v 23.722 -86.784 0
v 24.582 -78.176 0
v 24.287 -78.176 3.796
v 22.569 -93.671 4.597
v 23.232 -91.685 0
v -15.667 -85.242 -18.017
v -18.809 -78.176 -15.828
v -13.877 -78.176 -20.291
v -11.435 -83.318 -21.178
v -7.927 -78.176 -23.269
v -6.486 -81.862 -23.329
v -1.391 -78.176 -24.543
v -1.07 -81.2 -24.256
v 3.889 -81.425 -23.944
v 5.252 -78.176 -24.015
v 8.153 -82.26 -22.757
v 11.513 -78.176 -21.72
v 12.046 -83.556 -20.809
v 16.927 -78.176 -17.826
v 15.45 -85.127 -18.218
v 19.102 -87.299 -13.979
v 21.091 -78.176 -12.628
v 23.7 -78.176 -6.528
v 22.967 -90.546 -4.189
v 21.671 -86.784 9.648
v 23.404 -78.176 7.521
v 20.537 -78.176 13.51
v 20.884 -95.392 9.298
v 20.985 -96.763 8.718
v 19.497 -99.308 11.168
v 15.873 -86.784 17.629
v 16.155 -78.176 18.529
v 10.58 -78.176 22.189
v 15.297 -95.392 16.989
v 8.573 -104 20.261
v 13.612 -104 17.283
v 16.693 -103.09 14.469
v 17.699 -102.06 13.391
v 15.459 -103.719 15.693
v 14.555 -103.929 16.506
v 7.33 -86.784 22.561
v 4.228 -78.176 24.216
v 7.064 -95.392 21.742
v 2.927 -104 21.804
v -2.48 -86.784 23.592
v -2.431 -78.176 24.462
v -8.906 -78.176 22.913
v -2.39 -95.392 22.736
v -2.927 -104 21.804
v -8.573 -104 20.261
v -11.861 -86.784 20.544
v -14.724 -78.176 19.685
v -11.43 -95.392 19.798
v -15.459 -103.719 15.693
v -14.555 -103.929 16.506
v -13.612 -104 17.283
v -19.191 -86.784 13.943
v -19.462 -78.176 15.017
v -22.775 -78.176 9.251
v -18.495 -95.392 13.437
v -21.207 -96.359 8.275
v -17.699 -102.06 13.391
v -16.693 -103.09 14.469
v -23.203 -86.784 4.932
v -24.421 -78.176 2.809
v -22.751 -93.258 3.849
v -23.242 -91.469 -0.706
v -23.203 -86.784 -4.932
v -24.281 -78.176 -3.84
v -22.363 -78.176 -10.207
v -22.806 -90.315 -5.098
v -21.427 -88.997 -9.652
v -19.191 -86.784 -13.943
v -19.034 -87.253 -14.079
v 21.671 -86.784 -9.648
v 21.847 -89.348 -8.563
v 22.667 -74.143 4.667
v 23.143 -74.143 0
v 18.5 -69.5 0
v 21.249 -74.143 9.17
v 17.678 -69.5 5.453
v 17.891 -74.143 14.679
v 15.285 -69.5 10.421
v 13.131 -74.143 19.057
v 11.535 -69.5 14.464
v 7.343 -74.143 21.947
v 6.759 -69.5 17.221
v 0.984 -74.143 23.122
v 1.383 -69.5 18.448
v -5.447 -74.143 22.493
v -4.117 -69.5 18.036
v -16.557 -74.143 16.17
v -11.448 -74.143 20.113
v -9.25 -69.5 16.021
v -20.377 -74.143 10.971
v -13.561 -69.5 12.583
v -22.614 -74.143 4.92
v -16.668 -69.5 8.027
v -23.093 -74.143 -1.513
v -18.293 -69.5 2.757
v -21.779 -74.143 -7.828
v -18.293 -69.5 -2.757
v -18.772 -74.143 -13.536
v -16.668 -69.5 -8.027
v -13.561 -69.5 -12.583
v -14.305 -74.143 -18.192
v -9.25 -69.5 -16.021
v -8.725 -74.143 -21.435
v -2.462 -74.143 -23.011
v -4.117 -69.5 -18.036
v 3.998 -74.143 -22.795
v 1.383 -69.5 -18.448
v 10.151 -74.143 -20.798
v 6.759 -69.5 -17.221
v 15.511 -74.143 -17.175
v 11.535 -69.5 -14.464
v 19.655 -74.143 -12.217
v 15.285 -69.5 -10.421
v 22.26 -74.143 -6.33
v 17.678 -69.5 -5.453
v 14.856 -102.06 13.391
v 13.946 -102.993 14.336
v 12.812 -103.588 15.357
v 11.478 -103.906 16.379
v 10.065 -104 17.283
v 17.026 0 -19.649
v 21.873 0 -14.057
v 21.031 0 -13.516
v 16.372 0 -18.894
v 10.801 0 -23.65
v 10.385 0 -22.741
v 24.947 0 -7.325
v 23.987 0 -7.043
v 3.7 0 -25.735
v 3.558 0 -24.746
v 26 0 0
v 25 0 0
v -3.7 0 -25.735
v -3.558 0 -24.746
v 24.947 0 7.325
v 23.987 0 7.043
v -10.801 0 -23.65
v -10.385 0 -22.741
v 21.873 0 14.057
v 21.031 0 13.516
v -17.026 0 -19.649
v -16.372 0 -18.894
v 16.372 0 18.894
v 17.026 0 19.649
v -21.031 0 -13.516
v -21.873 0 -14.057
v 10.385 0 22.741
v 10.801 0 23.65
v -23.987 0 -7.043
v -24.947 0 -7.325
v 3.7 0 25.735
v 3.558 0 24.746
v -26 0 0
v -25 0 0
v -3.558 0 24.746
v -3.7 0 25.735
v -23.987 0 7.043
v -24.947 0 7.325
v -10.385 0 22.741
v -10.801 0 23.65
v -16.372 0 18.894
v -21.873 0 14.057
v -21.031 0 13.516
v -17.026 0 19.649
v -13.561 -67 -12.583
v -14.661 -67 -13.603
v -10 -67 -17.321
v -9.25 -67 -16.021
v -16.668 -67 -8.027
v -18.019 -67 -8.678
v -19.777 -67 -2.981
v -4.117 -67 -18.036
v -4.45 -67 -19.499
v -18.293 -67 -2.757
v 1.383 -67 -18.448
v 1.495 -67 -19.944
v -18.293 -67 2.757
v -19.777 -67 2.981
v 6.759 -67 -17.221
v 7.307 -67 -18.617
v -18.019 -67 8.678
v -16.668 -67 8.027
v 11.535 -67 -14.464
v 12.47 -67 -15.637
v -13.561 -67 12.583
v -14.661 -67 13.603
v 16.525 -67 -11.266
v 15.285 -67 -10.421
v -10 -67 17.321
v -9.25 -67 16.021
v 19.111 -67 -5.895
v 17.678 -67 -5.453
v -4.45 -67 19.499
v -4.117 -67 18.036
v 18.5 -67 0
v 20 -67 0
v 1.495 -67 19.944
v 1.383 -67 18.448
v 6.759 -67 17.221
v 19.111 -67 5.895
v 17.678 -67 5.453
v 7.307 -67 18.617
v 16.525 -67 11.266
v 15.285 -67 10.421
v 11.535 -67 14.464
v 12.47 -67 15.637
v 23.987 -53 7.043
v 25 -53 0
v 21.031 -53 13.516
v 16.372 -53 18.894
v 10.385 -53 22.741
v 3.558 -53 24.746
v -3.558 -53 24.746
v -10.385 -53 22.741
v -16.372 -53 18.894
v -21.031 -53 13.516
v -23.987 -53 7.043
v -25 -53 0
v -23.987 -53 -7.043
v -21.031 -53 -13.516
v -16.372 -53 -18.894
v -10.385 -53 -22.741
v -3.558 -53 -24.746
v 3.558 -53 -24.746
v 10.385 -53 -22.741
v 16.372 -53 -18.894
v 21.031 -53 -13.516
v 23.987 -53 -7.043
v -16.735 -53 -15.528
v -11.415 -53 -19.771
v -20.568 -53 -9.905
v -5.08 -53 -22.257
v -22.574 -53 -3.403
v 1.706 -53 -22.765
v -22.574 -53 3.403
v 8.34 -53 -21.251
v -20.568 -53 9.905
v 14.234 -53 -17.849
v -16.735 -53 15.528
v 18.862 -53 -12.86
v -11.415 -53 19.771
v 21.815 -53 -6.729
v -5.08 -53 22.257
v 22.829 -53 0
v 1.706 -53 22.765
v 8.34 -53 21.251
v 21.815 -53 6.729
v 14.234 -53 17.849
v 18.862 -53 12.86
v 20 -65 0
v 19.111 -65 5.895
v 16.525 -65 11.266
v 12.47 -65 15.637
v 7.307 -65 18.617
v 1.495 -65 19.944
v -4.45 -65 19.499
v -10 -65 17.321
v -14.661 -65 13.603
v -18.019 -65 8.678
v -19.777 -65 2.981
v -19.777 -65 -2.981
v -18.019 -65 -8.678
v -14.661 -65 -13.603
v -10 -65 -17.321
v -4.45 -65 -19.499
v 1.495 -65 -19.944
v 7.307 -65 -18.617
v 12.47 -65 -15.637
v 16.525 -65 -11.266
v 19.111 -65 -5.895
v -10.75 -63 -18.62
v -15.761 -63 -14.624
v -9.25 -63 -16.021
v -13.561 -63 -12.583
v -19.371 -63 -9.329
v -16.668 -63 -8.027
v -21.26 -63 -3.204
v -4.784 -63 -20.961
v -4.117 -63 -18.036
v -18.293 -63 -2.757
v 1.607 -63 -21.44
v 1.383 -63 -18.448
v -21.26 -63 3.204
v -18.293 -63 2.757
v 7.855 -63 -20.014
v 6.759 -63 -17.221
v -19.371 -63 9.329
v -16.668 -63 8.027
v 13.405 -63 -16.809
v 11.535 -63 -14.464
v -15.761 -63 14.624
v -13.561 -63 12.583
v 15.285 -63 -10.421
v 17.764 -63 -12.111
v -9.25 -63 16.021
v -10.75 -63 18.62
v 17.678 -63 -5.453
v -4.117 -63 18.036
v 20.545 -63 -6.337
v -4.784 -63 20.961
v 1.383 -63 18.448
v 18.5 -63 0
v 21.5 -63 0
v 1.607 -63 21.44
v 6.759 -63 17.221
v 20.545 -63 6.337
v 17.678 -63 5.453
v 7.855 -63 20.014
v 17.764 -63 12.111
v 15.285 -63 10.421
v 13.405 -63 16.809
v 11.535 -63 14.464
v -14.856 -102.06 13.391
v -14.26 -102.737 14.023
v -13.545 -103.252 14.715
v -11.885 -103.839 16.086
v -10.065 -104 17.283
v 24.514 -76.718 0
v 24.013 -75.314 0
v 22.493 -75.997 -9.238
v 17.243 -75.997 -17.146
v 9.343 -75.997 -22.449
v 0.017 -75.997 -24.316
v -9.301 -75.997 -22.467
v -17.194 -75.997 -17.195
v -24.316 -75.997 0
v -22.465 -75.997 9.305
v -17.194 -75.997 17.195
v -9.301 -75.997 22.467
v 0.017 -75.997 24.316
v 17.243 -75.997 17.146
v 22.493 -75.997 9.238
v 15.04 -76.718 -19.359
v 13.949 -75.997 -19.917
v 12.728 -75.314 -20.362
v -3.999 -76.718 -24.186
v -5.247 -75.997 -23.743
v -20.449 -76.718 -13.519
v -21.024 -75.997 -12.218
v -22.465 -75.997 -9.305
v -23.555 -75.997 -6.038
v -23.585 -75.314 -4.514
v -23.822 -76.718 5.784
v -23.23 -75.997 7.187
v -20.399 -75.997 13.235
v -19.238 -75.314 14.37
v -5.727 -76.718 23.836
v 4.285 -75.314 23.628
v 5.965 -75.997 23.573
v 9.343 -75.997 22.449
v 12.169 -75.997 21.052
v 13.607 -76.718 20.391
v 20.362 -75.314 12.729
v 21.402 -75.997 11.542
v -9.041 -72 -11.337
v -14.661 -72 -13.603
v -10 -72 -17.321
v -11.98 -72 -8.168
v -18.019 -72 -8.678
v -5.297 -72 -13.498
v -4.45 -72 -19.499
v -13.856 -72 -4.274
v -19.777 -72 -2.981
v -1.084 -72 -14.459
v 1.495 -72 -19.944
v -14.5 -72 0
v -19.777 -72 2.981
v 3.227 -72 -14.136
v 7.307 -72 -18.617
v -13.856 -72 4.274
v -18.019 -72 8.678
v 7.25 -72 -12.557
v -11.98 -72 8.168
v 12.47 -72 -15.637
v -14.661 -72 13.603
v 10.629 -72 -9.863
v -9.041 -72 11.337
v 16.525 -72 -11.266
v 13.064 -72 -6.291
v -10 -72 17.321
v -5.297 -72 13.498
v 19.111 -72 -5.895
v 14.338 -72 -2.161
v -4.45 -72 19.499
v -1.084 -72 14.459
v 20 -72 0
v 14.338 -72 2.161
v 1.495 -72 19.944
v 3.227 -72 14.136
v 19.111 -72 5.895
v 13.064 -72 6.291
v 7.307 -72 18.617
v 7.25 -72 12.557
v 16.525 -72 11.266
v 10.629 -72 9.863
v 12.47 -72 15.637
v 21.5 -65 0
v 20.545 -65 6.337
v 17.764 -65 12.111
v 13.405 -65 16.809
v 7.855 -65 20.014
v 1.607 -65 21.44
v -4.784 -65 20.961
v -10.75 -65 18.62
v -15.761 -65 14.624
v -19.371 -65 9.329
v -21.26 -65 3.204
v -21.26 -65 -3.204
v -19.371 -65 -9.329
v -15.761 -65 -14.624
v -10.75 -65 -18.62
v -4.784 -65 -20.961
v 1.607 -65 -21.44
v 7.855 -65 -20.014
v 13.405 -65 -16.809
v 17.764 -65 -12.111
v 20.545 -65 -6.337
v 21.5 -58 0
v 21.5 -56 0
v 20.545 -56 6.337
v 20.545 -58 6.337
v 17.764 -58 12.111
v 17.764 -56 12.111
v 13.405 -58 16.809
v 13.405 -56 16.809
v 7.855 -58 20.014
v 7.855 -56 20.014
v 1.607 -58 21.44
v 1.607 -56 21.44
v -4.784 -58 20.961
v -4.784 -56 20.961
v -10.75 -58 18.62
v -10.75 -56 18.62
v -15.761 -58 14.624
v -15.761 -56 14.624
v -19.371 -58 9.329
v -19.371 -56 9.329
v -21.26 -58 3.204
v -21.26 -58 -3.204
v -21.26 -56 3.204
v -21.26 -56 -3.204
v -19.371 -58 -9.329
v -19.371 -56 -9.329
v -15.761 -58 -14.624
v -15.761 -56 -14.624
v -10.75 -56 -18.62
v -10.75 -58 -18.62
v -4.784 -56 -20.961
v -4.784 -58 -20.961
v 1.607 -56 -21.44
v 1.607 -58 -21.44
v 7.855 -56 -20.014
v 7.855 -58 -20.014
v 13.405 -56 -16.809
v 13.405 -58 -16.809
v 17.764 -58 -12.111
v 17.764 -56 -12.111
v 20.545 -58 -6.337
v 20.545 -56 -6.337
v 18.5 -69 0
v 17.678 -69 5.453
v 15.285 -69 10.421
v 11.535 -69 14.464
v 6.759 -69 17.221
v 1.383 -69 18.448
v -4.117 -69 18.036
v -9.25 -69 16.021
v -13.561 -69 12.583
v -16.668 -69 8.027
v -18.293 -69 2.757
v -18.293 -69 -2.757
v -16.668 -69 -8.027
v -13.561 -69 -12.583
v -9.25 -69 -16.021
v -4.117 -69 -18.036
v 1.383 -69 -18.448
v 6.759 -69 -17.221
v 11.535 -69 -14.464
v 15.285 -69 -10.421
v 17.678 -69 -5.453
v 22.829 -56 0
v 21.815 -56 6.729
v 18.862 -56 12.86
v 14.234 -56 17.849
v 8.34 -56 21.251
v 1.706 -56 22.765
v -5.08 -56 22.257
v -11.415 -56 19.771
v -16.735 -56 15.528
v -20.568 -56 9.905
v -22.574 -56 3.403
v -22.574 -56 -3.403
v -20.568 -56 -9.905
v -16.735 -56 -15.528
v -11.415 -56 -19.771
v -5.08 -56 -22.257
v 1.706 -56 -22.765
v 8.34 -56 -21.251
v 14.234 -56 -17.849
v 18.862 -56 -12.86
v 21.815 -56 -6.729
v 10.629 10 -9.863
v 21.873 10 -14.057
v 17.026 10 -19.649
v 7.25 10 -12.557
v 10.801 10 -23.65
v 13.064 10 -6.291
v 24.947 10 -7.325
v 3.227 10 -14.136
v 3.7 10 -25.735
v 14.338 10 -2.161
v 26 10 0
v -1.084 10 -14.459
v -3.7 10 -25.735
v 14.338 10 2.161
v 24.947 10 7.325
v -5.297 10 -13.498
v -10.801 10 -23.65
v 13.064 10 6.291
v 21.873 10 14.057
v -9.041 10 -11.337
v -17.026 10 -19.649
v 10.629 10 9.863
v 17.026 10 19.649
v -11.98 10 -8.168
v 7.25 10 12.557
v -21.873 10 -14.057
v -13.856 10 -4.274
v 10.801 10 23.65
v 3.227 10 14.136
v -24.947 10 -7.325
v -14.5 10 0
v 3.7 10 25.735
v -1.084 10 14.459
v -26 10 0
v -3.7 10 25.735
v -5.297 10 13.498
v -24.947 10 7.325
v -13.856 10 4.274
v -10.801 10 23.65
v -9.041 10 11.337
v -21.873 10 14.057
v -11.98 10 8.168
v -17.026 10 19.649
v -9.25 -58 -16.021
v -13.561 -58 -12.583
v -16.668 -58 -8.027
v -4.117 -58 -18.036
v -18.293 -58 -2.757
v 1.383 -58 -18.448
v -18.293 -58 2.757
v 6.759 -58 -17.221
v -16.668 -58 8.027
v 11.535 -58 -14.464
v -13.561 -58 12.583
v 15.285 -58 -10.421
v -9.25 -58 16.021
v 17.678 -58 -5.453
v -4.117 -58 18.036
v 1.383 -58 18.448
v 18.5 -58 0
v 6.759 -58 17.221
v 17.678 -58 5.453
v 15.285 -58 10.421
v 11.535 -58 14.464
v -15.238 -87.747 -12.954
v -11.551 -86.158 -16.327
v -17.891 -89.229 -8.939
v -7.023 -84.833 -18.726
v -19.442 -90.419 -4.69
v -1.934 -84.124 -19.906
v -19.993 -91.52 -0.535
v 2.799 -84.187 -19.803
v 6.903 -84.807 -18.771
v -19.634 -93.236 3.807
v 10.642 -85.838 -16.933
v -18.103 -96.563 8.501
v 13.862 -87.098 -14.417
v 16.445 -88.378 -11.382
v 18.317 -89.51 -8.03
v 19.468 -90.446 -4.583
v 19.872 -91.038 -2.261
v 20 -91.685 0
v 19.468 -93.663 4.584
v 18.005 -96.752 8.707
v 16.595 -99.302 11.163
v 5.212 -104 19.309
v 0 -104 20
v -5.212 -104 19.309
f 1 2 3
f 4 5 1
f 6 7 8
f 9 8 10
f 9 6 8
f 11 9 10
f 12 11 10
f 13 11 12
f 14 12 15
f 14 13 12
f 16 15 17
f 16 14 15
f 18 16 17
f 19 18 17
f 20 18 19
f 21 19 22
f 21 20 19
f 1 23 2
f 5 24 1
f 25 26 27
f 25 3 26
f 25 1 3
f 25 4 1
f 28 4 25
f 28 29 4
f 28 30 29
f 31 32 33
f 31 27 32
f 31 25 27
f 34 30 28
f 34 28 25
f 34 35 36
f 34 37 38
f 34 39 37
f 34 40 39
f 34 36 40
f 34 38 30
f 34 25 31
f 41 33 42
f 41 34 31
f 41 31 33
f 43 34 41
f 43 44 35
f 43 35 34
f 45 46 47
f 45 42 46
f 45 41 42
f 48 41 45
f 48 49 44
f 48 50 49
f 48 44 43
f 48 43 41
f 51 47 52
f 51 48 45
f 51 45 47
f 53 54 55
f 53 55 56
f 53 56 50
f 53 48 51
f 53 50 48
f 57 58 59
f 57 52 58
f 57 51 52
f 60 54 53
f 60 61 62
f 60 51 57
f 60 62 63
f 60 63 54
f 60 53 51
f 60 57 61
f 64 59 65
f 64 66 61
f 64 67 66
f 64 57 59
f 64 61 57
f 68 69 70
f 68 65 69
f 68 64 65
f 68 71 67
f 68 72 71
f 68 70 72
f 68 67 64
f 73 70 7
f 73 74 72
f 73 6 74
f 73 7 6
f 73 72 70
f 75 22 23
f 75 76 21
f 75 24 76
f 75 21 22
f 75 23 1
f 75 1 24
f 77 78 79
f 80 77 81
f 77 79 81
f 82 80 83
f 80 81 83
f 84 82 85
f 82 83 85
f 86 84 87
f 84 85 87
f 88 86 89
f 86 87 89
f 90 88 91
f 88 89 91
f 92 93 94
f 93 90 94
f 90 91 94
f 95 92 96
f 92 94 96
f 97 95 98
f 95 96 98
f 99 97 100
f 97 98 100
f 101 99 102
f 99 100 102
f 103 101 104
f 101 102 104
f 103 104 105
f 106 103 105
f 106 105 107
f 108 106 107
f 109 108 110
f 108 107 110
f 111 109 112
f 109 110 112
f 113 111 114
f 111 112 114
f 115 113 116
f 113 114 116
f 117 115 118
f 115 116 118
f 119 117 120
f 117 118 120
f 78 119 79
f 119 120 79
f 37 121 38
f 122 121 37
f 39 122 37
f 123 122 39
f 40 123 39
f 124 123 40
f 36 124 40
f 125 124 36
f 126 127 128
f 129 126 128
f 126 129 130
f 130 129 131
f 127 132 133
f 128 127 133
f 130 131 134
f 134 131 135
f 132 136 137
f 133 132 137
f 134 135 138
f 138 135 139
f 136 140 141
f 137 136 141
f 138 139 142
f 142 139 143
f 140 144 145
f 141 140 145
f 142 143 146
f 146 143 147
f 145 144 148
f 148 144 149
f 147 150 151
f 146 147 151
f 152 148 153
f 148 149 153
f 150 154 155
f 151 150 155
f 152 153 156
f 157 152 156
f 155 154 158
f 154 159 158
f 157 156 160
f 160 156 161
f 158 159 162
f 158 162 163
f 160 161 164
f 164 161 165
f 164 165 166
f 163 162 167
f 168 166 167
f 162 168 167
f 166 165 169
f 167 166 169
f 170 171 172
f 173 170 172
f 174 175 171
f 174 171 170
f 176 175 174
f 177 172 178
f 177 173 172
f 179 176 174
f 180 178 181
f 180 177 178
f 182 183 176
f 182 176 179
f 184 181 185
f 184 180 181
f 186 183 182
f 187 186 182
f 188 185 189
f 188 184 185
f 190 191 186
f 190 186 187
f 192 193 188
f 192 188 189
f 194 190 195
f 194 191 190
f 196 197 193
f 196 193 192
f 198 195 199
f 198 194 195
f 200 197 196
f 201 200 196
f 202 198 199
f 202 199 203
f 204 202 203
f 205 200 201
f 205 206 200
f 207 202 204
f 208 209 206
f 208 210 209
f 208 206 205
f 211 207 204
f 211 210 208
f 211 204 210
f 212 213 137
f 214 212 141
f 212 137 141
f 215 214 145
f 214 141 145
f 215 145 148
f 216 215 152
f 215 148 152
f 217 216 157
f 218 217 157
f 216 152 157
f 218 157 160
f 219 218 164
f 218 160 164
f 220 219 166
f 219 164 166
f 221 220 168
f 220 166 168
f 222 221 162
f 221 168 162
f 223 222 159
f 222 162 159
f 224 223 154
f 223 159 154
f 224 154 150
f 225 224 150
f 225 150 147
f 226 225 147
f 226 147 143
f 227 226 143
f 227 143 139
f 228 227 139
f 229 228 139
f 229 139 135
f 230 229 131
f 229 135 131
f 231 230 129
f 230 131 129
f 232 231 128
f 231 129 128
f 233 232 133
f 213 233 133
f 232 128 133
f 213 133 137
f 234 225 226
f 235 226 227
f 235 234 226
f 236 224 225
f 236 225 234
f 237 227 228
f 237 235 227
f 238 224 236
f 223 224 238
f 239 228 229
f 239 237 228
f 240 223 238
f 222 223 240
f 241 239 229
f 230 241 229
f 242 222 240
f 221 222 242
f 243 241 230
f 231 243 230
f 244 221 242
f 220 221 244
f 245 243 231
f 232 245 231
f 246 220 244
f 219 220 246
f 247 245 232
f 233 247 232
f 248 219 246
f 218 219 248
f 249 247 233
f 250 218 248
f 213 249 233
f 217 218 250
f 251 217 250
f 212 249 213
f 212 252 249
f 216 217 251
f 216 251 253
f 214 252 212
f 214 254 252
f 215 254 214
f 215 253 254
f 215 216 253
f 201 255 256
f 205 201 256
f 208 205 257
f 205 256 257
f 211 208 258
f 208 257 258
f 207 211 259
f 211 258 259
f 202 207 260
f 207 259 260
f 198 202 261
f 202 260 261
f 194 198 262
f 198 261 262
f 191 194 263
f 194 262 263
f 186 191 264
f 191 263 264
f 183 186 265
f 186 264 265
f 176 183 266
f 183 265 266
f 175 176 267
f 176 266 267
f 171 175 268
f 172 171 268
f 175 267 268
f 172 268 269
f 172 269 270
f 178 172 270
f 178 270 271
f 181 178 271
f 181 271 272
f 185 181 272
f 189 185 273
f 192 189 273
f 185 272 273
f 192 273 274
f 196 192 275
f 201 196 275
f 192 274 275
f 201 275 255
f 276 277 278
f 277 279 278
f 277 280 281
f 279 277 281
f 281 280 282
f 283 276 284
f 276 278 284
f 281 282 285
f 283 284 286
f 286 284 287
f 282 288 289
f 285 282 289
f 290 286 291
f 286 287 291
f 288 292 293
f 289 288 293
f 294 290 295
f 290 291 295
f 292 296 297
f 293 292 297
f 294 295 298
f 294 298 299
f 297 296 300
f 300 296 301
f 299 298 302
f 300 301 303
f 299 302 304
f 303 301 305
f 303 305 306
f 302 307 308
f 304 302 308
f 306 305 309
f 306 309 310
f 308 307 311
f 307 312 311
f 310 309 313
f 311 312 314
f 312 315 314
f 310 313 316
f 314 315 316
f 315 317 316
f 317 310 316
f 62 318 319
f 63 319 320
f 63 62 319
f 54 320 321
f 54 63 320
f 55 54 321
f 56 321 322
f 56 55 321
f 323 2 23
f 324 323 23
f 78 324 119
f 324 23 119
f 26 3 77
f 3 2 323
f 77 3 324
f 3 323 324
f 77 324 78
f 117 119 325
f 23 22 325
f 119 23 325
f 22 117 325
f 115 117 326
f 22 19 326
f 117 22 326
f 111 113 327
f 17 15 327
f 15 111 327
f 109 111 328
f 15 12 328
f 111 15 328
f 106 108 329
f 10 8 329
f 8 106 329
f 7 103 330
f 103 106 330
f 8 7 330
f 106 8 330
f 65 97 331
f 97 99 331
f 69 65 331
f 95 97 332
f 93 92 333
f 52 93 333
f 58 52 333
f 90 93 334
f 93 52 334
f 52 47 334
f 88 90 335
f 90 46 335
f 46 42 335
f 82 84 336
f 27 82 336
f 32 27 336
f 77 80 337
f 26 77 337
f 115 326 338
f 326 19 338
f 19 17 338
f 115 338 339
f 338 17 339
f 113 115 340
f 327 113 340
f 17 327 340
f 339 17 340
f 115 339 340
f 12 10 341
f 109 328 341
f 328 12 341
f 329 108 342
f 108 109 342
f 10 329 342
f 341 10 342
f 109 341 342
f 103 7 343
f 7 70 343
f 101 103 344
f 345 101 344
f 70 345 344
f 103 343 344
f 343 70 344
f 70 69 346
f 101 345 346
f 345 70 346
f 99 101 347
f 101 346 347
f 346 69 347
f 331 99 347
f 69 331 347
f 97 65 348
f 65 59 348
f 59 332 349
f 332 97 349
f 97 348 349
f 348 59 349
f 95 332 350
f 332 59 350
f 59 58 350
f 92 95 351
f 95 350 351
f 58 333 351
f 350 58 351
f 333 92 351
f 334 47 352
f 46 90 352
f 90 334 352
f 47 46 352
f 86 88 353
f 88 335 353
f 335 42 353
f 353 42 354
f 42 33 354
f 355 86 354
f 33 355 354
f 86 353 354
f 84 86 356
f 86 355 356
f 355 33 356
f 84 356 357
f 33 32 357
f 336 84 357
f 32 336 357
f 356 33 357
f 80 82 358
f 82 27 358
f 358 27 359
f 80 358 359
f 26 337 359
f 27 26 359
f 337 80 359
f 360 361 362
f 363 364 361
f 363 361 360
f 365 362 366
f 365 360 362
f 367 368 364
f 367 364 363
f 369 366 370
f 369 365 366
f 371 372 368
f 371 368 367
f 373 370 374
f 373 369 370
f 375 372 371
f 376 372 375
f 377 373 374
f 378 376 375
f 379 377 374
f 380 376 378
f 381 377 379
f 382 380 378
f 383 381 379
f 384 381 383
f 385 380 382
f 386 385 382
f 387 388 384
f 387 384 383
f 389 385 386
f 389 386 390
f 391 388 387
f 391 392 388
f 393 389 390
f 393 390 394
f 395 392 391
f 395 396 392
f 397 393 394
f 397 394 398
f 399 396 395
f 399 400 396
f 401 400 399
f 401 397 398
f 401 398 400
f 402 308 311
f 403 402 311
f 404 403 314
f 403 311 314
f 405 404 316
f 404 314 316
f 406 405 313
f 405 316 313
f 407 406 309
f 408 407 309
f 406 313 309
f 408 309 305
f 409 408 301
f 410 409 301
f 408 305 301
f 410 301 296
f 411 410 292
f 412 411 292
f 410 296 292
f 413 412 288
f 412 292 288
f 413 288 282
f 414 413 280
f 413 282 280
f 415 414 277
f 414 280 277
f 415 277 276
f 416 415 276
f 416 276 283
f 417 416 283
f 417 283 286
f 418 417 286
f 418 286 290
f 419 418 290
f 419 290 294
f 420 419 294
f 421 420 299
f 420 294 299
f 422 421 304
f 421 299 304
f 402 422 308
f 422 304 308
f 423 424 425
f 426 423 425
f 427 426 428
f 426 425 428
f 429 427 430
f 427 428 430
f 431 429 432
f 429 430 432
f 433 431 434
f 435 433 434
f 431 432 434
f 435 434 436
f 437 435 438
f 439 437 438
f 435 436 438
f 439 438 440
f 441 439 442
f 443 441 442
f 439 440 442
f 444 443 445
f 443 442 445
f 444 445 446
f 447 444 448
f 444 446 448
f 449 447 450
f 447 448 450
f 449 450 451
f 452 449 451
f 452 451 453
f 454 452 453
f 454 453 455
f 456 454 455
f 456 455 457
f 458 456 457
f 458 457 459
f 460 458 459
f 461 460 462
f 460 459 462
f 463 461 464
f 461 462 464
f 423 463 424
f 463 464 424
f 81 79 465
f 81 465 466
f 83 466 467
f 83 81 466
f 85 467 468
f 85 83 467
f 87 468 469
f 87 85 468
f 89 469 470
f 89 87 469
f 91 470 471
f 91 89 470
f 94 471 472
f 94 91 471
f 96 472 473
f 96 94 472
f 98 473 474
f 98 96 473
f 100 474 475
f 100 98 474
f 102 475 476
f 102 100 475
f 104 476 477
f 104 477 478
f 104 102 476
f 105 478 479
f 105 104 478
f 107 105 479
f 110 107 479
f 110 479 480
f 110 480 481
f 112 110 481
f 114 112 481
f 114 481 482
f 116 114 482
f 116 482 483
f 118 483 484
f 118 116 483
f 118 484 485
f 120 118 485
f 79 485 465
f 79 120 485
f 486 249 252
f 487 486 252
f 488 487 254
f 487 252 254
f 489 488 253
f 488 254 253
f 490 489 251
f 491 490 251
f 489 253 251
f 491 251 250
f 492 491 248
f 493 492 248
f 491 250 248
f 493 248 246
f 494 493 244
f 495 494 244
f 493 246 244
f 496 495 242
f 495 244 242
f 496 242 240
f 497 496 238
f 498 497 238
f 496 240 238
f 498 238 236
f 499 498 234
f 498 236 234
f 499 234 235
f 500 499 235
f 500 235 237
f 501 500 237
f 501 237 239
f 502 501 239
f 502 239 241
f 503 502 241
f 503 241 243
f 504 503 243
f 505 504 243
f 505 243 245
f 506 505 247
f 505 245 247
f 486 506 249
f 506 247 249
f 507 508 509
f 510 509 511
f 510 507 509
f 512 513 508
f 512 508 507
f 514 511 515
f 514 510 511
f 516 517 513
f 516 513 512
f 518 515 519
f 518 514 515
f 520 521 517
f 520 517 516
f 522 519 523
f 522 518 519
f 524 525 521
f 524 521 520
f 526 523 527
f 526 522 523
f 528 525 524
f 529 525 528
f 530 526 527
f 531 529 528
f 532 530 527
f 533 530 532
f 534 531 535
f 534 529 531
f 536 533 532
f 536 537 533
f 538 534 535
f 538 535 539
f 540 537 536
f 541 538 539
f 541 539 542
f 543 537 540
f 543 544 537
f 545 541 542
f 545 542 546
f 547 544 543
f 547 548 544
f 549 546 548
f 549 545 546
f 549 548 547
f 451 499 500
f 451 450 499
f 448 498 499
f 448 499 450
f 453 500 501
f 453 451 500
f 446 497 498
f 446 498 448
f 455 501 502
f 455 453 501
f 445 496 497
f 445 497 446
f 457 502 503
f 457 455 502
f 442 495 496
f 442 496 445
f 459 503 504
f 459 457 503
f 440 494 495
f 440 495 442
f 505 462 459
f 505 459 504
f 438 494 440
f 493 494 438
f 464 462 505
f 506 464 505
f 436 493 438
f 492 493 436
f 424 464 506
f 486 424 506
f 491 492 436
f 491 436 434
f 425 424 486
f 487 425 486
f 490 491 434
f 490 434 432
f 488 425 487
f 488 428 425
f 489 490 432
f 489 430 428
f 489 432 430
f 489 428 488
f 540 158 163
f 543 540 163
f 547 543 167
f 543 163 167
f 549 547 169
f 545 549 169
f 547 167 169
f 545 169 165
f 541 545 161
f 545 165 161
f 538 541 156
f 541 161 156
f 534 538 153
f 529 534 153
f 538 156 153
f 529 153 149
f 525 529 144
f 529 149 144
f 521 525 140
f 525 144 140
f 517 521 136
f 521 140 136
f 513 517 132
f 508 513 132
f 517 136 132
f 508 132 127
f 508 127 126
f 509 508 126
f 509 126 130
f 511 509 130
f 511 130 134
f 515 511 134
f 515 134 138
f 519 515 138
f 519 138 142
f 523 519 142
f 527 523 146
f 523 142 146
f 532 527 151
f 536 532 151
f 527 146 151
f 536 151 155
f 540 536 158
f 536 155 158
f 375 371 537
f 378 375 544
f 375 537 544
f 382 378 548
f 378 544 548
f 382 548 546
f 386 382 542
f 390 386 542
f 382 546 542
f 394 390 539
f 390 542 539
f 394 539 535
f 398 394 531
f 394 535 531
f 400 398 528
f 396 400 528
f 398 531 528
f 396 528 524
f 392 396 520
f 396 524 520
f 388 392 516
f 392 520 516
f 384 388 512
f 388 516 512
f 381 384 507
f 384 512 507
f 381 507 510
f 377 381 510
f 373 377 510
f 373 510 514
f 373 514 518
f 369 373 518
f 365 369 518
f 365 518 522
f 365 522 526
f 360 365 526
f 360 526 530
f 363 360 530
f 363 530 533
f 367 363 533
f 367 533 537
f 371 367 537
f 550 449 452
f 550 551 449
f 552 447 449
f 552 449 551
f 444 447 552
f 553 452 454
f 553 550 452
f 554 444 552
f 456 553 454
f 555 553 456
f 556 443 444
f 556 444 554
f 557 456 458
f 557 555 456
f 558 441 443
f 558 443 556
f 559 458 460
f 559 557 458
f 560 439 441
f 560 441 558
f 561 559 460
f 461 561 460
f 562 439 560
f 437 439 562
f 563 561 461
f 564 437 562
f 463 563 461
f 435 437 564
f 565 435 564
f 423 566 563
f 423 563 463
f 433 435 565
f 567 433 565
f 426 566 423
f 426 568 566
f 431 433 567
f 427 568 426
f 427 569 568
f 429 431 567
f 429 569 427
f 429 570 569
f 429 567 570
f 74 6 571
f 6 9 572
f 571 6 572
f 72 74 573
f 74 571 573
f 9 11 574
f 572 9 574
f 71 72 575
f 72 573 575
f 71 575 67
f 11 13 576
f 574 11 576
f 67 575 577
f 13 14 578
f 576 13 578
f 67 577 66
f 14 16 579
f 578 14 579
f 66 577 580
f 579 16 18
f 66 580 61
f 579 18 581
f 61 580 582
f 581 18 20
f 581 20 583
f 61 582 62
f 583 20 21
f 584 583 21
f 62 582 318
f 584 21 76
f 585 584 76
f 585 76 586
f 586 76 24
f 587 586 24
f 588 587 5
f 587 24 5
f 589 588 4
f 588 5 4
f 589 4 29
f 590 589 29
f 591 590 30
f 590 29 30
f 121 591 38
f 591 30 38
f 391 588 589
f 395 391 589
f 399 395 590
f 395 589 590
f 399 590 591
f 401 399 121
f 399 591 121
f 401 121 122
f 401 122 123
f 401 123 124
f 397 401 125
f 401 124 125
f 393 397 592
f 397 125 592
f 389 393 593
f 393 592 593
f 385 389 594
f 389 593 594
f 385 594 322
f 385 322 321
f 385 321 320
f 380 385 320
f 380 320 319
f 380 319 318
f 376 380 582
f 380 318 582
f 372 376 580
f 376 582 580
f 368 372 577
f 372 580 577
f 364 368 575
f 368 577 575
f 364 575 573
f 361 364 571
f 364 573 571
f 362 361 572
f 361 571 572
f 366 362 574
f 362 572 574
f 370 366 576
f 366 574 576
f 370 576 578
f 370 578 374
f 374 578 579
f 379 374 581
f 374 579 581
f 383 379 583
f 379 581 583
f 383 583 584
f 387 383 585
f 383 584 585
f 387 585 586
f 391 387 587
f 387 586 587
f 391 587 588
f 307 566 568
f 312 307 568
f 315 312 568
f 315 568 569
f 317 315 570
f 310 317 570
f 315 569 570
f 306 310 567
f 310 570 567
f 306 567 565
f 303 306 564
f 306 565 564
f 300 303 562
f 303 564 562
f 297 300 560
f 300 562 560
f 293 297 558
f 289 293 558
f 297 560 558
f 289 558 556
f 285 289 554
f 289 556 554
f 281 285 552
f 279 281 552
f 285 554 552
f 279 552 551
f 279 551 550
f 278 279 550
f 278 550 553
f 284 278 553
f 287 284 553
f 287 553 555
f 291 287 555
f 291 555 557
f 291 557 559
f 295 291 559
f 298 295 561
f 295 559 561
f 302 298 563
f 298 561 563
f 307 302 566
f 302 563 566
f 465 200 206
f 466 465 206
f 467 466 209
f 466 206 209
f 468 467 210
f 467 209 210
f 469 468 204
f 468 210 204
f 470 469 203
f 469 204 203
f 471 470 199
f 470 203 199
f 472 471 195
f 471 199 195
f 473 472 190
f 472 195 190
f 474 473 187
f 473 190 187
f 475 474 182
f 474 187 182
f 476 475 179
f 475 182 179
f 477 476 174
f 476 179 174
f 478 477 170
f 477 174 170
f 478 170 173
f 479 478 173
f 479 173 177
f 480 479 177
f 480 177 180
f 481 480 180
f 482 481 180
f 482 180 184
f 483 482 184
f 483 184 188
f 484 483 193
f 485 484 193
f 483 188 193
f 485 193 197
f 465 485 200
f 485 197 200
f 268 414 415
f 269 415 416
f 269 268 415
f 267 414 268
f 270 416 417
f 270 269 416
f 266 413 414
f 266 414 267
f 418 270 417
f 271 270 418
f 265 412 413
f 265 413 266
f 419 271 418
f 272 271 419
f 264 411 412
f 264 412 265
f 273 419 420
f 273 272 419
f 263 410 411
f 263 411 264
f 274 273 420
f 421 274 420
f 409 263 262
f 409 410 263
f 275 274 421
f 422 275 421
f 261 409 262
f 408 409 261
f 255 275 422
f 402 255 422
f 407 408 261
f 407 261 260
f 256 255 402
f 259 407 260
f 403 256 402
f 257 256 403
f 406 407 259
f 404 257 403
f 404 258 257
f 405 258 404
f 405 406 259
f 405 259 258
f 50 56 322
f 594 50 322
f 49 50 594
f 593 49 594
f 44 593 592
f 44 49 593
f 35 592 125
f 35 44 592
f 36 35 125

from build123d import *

# Parameters (mm, degrees)
F0_R         = 25
F1_DEPTH     = 53
F2_R         = 26
F3_DEPTH     = 10
F4_R         = 22.8291590373
F5_DEPTH     = 3
F6_R         = 21.5
F7_DEPTH     = 2
F8_R         = 18.5
F9_DEPTH     = 5
F10_R        = 21.5
F11_DEPTH    = 2
F12_R        = 20
F13_DEPTH    = 2
F14_R        = 18.5
F15_DEPTH    = 2
F16_R        = 25
F17_DEPTH    = 35
F18_R        = 20
F19_DEPTH    = 32
F20_S5_R     = 18.5
F20_T6_DEPTH = 37
F22_R        = 5
F25_DEPTH    = 52.3
F26_T1_DEPTH = 15.5791600382
F26_T3_DEPTH = 15.5791600382
F27_R        = 14.5
F28_DEPTH    = 128


# Not quite as in the source:
# - a fillet or chamfer that OpenCascade refuses, or shapes differently, is made with other operations: its cross-section is extruded or revolved along the edge and cut away or added


with BuildPart() as f1:
    # F0 (on Front) → F1 (new body)
    with BuildSketch(Plane.XZ):
        Circle(F0_R)
    extrude(amount=F1_DEPTH)

    # F2 (on face) → F3 (join)
    with BuildSketch(Plane(origin=(0, 0, 0), x_dir=(-1, 0, 0), z_dir=(0, 1, 0))):
        Circle(F2_R)
    extrude(amount=F3_DEPTH)

    # F4 (on face) → F5 (join)
    with BuildSketch(Plane.XZ.offset(53)):
        Circle(F4_R)
    extrude(amount=F5_DEPTH)

    # F6 (on face) → F7 (join)
    with BuildSketch(Plane.XZ.offset(56)):
        Circle(F6_R)
    extrude(amount=F7_DEPTH)

    # F8 (on face) → F9 (join)
    with BuildSketch(Plane.XZ.offset(58)):
        Circle(F8_R)
    extrude(amount=F9_DEPTH)

    # F10 (on face) → F11 (join)
    with BuildSketch(Plane.XZ.offset(63)):
        Circle(F10_R)
    extrude(amount=F11_DEPTH)

    # F12 (on face) → F13 (join)
    with BuildSketch(Plane.XZ.offset(65)):
        Circle(F12_R)
    extrude(amount=F13_DEPTH)

    # F14 (on face) → F15 (join)
    with BuildSketch(Plane.XZ.offset(67)):
        Circle(F14_R)
    extrude(amount=F15_DEPTH)

    # F16 (on face) → F17 (join)
    with BuildSketch(Plane.XZ.offset(69)):
        Circle(F16_R)
    extrude(amount=F17_DEPTH)

    # F18 (on face) → F19 (cut)
    with BuildSketch(Plane.XZ.offset(104)):
        Circle(F18_R)
    extrude(amount=-F19_DEPTH, mode=Mode.SUBTRACT)

    # F20: chamfer of 7 on 1 edges, made by hand


with BuildPart() as f20_tool2:
    # F20_s3 → F20_t4 (revolve)
    with BuildSketch(Plane.XY):
        Polygon((25, -76), (18, -69), (25, -69), align=None)
    revolve(axis=Axis((0, -69, 0), (0, -1, 0)))

    # F20_s5 → F20_t6 (cut, symmetric)
    with BuildSketch(Plane.XZ.offset(72.5)):
        Circle(F20_S5_R)
    extrude(amount=F20_T6_DEPTH, both=True, mode=Mode.SUBTRACT)


with BuildPart() as f1_1:
    add(f1.part)

    # F20_t1: cut F20_tool2
    add(f20_tool2.part, mode=Mode.SUBTRACT)

    # F21: chamfer of 3 x 30 on 1 edges, made by hand

    # F21_s1 → F21_t2 (revolve, cut)
    with BuildSketch(Plane.XY):
        Polygon((25, -74), (22, -104), (25, -104), align=None)
    revolve(axis=Axis((0, -104, 0), (0, -1, 0)), mode=Mode.SUBTRACT)

    # F22
    f22_edges = [f1_1.edges().sort_by_distance(p)[0] for p in [
        (-24.818182, -75.818182, 0),
    ]]
    fillet(f22_edges, radius=F22_R)

    # F24 (on offset) → F25 (cut)
    with BuildSketch(Plane.YZ.offset(26.9)):
        with BuildLine():
            Line((-78, -31.0485586524), (-78, -28.3997934312))
            add(Edge.make_bspline(
                [(-78, -28.3997934312), (-98.6184179783, -3.1667915173), (-82.4469923973, 1.2942913454), (-107.4011772871, 17.0474909246)],
                knots=[0, 0, 0, 0, 54.1284110351, 54.1284110351, 54.1284110351, 54.1284110351], degree=3))
            Line((-107.4011772871, 17.0474909246), (-107.4011772871, -31.0485586524))
            Line((-107.4011772871, -31.0485586524), (-78, -31.0485586524))
        make_face()
    extrude(amount=-F25_DEPTH, mode=Mode.SUBTRACT)

    # F26: fillet of radius 5 on 2 edges, made by hand

    # F26_s2 → F26_t1 (cut)
    with BuildSketch(Plane.YZ.offset(7.0799043749)):
        with BuildLine():
            ThreePointArc((-102.0117387885, 13.3536507945), (-103.4757188766, 15.1160616448), (-104.0004, 17.346317106))
            Line((-104.0004, 17.346317106), (-104.50064, 17.346317106))
            ThreePointArc((-104.50064, 17.346317106), (-104.50024, 16.0708587935), (-104.50024, 14.795400481))
            Line((-104.50024, 14.795400481), (-104.286297169, 14.3851883546))
            ThreePointArc((-104.286297169, 14.3851883546), (-103.2925012303, 13.6788063197), (-102.3131126673, 12.9543841634))
            Line((-102.3131126673, 12.9543841634), (-102.0117387885, 13.3536507945))
        make_face()
    extrude(amount=F26_T1_DEPTH, mode=Mode.SUBTRACT)

    # F26_s4 → F26_t3 (cut)
    with BuildSketch(Plane.YZ.offset(-22.6590644131)):
        with BuildLine():
            ThreePointArc((-102.0117387885, 13.3536507945), (-103.4757188766, 15.1160616448), (-104.0004, 17.346317106))
            Line((-104.0004, 17.346317106), (-104.50064, 17.346317106))
            ThreePointArc((-104.50064, 17.346317106), (-104.50024, 16.0708587935), (-104.50024, 14.795400481))
            Line((-104.50024, 14.795400481), (-104.286297169, 14.3851883546))
            ThreePointArc((-104.286297169, 14.3851883546), (-103.2925012303, 13.6788063197), (-102.3131126673, 12.9543841634))
            Line((-102.3131126673, 12.9543841634), (-102.0117387885, 13.3536507945))
        make_face()
    extrude(amount=F26_T3_DEPTH, mode=Mode.SUBTRACT)

    # F27 (on face) → F28 (cut)
    with BuildSketch(Plane(origin=(0, 10, 0), x_dir=(-1, 0, 0), z_dir=(0, 1, 0))):
        Circle(F27_R)
    extrude(amount=-F28_DEPTH, mode=Mode.SUBTRACT)


solid = f1_1.part
